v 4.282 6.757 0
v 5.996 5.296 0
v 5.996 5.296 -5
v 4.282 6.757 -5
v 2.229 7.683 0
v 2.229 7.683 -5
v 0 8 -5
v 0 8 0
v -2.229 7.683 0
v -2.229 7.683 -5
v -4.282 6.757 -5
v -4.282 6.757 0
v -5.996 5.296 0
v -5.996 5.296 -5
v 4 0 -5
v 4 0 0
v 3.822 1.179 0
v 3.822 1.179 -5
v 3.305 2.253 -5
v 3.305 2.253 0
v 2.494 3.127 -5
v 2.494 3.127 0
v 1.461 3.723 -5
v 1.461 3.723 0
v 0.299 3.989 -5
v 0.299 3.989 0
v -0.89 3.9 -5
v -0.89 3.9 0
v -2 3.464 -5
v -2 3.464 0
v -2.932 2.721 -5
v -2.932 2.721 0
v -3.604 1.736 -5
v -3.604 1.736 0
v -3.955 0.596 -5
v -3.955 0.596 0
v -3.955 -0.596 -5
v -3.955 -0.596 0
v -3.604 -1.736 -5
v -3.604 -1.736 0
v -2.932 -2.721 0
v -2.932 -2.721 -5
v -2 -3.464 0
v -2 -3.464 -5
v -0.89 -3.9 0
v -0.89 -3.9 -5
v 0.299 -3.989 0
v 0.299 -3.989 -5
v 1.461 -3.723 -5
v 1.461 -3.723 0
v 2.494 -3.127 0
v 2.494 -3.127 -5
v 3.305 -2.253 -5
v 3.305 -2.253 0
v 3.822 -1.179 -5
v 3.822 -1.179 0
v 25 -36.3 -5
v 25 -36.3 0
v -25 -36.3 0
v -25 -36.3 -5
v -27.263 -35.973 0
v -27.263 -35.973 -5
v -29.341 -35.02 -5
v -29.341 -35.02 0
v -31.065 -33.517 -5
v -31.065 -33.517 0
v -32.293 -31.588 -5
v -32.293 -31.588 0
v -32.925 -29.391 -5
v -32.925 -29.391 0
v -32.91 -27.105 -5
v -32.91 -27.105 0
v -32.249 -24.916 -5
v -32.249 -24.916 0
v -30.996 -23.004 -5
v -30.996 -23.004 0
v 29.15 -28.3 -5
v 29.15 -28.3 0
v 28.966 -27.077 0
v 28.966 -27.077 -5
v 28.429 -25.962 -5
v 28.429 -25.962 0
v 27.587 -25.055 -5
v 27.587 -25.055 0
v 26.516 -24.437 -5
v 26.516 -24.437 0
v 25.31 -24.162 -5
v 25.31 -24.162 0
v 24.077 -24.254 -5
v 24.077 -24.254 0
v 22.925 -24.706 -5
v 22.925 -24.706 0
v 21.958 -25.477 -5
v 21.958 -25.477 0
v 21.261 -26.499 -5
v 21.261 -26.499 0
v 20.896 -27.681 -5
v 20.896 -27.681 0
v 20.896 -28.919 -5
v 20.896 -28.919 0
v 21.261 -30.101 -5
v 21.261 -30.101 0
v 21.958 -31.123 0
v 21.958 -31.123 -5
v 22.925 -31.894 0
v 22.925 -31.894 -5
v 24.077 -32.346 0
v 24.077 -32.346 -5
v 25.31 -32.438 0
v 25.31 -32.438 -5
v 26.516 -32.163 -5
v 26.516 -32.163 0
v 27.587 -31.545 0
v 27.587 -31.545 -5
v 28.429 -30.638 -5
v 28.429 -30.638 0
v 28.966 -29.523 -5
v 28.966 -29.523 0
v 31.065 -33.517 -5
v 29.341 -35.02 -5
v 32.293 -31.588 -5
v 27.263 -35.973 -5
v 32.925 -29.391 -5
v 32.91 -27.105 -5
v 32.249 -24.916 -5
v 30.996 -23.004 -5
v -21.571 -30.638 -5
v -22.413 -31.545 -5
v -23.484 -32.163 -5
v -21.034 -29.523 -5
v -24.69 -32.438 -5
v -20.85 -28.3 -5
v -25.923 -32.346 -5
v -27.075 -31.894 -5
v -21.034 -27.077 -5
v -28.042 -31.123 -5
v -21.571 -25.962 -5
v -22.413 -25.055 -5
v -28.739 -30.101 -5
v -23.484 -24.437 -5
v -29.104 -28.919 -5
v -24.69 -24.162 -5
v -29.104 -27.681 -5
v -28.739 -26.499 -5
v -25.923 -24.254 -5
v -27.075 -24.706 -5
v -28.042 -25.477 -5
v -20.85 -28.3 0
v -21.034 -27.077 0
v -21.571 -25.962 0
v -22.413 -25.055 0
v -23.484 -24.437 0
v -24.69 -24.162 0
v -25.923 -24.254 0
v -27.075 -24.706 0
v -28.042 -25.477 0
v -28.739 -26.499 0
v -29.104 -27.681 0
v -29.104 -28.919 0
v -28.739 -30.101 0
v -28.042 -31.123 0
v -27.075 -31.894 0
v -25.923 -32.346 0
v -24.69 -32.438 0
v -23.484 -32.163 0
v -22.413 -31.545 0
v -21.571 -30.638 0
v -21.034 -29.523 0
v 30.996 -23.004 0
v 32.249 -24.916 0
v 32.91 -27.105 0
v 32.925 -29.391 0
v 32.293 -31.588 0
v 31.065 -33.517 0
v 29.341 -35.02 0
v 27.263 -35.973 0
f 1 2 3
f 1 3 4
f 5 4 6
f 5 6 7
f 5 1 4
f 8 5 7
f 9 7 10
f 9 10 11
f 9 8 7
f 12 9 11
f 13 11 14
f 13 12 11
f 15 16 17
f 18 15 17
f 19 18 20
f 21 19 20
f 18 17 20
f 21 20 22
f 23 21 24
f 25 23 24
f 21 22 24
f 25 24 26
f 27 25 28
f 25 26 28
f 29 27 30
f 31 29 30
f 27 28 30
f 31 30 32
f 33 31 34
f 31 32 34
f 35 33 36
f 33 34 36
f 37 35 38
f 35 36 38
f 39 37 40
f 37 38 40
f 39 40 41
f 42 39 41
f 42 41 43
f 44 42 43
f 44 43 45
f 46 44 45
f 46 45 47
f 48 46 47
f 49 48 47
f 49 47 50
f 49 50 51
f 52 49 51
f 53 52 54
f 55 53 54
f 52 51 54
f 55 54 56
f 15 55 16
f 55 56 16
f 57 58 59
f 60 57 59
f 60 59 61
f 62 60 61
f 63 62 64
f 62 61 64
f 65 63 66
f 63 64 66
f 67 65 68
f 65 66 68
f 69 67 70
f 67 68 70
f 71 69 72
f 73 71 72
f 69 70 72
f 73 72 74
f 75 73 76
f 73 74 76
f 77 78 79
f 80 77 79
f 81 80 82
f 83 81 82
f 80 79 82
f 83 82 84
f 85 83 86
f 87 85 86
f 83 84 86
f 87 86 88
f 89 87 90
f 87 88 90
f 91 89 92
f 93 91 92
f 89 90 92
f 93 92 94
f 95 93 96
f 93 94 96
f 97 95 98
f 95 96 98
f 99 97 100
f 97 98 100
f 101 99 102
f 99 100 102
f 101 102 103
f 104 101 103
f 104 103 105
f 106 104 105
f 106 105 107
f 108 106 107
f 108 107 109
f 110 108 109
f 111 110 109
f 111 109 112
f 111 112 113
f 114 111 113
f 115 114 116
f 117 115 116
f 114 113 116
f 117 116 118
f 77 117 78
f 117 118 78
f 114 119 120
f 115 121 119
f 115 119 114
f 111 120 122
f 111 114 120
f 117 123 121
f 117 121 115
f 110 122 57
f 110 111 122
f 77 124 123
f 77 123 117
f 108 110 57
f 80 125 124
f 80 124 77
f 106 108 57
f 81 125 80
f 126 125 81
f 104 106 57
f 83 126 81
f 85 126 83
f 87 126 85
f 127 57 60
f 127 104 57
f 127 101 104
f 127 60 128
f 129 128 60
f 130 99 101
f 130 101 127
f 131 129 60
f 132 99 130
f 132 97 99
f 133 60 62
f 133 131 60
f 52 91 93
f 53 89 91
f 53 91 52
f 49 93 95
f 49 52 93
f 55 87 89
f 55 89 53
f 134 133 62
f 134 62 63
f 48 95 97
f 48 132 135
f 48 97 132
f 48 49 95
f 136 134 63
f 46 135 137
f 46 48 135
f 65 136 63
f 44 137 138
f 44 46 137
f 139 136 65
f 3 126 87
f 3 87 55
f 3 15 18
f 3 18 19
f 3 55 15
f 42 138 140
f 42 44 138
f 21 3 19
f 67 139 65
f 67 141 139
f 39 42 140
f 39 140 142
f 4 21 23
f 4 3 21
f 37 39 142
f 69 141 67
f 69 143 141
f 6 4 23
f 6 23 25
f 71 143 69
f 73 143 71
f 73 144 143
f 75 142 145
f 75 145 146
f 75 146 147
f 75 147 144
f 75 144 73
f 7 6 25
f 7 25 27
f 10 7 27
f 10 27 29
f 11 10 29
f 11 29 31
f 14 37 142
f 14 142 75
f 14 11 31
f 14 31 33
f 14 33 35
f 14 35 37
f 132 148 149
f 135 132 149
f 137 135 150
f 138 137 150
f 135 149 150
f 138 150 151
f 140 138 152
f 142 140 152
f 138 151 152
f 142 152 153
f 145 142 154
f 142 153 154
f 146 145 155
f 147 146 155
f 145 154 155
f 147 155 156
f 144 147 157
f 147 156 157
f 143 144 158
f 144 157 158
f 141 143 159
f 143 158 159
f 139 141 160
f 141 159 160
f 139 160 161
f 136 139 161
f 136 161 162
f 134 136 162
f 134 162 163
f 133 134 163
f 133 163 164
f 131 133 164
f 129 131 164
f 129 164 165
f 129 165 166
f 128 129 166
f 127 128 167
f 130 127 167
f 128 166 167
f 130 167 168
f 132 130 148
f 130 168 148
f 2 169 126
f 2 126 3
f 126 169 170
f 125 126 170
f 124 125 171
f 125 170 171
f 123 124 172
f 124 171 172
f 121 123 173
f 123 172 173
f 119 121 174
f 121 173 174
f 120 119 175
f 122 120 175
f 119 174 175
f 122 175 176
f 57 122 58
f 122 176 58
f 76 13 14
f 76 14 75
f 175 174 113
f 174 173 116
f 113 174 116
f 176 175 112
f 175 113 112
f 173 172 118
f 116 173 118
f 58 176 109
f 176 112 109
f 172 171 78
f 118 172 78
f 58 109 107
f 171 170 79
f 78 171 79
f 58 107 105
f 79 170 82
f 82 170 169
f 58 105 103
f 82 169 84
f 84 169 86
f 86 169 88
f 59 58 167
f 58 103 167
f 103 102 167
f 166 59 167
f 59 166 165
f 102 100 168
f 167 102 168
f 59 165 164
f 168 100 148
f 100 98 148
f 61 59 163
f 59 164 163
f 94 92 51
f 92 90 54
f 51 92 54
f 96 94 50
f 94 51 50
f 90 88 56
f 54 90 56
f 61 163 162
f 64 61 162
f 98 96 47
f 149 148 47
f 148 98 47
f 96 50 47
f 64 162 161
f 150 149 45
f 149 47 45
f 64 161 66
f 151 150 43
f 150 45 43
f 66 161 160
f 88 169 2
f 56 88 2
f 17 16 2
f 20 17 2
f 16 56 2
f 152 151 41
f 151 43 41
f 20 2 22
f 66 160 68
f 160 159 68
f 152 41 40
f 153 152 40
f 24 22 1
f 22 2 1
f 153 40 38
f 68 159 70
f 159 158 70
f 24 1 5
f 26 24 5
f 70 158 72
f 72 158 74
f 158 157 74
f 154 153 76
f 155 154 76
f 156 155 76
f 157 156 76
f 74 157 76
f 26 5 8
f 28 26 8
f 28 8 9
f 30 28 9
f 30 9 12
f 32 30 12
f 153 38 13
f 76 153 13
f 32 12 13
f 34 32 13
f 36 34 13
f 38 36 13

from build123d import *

# Parameters (mm, degrees)
SKETCH1_R           = 4
SKETCH1_R_2         = 4.15
BOSS_EXTRUDE2_DEPTH = 5


with BuildPart() as part:
    # Sketch1 → Boss-Extrude2 (new body)
    # profile 1 of 2: a face of its own
    with BuildSketch(Plane.XY):
        with BuildLine():
            Line((-25, -20.3), (25, -20.3))
            ThreePointArc((25, -20.3), (28.288479467, -21.007133431), (30.995610492, -23.003524301))
            Line((30.995610492, -23.003524301), (5.995610492, 5.296475699))
            ThreePointArc((5.995610492, 5.296475699), (0, 8), (-5.995610492, 5.296475699))
            Line((-5.995610492, 5.296475699), (-30.995610492, -23.003524301))
            ThreePointArc((-30.995610492, -23.003524301), (-28.288479467, -21.007133431), (-25, -20.3))
        make_face()
        Circle(SKETCH1_R, mode=Mode.SUBTRACT)
    # profile 2 of 2: a face of its own
    with BuildSketch(Plane.XY):
        with BuildLine():
            ThreePointArc((25, -20.3), (28.288479467, -21.007133431), (30.995610492, -23.003524301))
            ThreePointArc((30.995610492, -23.003524301), (32.292866569, -31.588479467), (25, -36.3))
            Line((25, -36.3), (-25, -36.3))
            ThreePointArc((-25, -36.3), (-32.292866569, -31.588479467), (-30.995610492, -23.003524301))
            ThreePointArc((-30.995610492, -23.003524301), (-28.288479467, -21.007133431), (-25, -20.3))
            Line((-25, -20.3), (25, -20.3))
        make_face()
        with Locations((-25, -28.3)):
            Circle(SKETCH1_R_2, mode=Mode.SUBTRACT)
        with Locations((25, -28.3)):
            Circle(SKETCH1_R_2, mode=Mode.SUBTRACT)
    extrude(amount=-BOSS_EXTRUDE2_DEPTH)


solid = part.part
